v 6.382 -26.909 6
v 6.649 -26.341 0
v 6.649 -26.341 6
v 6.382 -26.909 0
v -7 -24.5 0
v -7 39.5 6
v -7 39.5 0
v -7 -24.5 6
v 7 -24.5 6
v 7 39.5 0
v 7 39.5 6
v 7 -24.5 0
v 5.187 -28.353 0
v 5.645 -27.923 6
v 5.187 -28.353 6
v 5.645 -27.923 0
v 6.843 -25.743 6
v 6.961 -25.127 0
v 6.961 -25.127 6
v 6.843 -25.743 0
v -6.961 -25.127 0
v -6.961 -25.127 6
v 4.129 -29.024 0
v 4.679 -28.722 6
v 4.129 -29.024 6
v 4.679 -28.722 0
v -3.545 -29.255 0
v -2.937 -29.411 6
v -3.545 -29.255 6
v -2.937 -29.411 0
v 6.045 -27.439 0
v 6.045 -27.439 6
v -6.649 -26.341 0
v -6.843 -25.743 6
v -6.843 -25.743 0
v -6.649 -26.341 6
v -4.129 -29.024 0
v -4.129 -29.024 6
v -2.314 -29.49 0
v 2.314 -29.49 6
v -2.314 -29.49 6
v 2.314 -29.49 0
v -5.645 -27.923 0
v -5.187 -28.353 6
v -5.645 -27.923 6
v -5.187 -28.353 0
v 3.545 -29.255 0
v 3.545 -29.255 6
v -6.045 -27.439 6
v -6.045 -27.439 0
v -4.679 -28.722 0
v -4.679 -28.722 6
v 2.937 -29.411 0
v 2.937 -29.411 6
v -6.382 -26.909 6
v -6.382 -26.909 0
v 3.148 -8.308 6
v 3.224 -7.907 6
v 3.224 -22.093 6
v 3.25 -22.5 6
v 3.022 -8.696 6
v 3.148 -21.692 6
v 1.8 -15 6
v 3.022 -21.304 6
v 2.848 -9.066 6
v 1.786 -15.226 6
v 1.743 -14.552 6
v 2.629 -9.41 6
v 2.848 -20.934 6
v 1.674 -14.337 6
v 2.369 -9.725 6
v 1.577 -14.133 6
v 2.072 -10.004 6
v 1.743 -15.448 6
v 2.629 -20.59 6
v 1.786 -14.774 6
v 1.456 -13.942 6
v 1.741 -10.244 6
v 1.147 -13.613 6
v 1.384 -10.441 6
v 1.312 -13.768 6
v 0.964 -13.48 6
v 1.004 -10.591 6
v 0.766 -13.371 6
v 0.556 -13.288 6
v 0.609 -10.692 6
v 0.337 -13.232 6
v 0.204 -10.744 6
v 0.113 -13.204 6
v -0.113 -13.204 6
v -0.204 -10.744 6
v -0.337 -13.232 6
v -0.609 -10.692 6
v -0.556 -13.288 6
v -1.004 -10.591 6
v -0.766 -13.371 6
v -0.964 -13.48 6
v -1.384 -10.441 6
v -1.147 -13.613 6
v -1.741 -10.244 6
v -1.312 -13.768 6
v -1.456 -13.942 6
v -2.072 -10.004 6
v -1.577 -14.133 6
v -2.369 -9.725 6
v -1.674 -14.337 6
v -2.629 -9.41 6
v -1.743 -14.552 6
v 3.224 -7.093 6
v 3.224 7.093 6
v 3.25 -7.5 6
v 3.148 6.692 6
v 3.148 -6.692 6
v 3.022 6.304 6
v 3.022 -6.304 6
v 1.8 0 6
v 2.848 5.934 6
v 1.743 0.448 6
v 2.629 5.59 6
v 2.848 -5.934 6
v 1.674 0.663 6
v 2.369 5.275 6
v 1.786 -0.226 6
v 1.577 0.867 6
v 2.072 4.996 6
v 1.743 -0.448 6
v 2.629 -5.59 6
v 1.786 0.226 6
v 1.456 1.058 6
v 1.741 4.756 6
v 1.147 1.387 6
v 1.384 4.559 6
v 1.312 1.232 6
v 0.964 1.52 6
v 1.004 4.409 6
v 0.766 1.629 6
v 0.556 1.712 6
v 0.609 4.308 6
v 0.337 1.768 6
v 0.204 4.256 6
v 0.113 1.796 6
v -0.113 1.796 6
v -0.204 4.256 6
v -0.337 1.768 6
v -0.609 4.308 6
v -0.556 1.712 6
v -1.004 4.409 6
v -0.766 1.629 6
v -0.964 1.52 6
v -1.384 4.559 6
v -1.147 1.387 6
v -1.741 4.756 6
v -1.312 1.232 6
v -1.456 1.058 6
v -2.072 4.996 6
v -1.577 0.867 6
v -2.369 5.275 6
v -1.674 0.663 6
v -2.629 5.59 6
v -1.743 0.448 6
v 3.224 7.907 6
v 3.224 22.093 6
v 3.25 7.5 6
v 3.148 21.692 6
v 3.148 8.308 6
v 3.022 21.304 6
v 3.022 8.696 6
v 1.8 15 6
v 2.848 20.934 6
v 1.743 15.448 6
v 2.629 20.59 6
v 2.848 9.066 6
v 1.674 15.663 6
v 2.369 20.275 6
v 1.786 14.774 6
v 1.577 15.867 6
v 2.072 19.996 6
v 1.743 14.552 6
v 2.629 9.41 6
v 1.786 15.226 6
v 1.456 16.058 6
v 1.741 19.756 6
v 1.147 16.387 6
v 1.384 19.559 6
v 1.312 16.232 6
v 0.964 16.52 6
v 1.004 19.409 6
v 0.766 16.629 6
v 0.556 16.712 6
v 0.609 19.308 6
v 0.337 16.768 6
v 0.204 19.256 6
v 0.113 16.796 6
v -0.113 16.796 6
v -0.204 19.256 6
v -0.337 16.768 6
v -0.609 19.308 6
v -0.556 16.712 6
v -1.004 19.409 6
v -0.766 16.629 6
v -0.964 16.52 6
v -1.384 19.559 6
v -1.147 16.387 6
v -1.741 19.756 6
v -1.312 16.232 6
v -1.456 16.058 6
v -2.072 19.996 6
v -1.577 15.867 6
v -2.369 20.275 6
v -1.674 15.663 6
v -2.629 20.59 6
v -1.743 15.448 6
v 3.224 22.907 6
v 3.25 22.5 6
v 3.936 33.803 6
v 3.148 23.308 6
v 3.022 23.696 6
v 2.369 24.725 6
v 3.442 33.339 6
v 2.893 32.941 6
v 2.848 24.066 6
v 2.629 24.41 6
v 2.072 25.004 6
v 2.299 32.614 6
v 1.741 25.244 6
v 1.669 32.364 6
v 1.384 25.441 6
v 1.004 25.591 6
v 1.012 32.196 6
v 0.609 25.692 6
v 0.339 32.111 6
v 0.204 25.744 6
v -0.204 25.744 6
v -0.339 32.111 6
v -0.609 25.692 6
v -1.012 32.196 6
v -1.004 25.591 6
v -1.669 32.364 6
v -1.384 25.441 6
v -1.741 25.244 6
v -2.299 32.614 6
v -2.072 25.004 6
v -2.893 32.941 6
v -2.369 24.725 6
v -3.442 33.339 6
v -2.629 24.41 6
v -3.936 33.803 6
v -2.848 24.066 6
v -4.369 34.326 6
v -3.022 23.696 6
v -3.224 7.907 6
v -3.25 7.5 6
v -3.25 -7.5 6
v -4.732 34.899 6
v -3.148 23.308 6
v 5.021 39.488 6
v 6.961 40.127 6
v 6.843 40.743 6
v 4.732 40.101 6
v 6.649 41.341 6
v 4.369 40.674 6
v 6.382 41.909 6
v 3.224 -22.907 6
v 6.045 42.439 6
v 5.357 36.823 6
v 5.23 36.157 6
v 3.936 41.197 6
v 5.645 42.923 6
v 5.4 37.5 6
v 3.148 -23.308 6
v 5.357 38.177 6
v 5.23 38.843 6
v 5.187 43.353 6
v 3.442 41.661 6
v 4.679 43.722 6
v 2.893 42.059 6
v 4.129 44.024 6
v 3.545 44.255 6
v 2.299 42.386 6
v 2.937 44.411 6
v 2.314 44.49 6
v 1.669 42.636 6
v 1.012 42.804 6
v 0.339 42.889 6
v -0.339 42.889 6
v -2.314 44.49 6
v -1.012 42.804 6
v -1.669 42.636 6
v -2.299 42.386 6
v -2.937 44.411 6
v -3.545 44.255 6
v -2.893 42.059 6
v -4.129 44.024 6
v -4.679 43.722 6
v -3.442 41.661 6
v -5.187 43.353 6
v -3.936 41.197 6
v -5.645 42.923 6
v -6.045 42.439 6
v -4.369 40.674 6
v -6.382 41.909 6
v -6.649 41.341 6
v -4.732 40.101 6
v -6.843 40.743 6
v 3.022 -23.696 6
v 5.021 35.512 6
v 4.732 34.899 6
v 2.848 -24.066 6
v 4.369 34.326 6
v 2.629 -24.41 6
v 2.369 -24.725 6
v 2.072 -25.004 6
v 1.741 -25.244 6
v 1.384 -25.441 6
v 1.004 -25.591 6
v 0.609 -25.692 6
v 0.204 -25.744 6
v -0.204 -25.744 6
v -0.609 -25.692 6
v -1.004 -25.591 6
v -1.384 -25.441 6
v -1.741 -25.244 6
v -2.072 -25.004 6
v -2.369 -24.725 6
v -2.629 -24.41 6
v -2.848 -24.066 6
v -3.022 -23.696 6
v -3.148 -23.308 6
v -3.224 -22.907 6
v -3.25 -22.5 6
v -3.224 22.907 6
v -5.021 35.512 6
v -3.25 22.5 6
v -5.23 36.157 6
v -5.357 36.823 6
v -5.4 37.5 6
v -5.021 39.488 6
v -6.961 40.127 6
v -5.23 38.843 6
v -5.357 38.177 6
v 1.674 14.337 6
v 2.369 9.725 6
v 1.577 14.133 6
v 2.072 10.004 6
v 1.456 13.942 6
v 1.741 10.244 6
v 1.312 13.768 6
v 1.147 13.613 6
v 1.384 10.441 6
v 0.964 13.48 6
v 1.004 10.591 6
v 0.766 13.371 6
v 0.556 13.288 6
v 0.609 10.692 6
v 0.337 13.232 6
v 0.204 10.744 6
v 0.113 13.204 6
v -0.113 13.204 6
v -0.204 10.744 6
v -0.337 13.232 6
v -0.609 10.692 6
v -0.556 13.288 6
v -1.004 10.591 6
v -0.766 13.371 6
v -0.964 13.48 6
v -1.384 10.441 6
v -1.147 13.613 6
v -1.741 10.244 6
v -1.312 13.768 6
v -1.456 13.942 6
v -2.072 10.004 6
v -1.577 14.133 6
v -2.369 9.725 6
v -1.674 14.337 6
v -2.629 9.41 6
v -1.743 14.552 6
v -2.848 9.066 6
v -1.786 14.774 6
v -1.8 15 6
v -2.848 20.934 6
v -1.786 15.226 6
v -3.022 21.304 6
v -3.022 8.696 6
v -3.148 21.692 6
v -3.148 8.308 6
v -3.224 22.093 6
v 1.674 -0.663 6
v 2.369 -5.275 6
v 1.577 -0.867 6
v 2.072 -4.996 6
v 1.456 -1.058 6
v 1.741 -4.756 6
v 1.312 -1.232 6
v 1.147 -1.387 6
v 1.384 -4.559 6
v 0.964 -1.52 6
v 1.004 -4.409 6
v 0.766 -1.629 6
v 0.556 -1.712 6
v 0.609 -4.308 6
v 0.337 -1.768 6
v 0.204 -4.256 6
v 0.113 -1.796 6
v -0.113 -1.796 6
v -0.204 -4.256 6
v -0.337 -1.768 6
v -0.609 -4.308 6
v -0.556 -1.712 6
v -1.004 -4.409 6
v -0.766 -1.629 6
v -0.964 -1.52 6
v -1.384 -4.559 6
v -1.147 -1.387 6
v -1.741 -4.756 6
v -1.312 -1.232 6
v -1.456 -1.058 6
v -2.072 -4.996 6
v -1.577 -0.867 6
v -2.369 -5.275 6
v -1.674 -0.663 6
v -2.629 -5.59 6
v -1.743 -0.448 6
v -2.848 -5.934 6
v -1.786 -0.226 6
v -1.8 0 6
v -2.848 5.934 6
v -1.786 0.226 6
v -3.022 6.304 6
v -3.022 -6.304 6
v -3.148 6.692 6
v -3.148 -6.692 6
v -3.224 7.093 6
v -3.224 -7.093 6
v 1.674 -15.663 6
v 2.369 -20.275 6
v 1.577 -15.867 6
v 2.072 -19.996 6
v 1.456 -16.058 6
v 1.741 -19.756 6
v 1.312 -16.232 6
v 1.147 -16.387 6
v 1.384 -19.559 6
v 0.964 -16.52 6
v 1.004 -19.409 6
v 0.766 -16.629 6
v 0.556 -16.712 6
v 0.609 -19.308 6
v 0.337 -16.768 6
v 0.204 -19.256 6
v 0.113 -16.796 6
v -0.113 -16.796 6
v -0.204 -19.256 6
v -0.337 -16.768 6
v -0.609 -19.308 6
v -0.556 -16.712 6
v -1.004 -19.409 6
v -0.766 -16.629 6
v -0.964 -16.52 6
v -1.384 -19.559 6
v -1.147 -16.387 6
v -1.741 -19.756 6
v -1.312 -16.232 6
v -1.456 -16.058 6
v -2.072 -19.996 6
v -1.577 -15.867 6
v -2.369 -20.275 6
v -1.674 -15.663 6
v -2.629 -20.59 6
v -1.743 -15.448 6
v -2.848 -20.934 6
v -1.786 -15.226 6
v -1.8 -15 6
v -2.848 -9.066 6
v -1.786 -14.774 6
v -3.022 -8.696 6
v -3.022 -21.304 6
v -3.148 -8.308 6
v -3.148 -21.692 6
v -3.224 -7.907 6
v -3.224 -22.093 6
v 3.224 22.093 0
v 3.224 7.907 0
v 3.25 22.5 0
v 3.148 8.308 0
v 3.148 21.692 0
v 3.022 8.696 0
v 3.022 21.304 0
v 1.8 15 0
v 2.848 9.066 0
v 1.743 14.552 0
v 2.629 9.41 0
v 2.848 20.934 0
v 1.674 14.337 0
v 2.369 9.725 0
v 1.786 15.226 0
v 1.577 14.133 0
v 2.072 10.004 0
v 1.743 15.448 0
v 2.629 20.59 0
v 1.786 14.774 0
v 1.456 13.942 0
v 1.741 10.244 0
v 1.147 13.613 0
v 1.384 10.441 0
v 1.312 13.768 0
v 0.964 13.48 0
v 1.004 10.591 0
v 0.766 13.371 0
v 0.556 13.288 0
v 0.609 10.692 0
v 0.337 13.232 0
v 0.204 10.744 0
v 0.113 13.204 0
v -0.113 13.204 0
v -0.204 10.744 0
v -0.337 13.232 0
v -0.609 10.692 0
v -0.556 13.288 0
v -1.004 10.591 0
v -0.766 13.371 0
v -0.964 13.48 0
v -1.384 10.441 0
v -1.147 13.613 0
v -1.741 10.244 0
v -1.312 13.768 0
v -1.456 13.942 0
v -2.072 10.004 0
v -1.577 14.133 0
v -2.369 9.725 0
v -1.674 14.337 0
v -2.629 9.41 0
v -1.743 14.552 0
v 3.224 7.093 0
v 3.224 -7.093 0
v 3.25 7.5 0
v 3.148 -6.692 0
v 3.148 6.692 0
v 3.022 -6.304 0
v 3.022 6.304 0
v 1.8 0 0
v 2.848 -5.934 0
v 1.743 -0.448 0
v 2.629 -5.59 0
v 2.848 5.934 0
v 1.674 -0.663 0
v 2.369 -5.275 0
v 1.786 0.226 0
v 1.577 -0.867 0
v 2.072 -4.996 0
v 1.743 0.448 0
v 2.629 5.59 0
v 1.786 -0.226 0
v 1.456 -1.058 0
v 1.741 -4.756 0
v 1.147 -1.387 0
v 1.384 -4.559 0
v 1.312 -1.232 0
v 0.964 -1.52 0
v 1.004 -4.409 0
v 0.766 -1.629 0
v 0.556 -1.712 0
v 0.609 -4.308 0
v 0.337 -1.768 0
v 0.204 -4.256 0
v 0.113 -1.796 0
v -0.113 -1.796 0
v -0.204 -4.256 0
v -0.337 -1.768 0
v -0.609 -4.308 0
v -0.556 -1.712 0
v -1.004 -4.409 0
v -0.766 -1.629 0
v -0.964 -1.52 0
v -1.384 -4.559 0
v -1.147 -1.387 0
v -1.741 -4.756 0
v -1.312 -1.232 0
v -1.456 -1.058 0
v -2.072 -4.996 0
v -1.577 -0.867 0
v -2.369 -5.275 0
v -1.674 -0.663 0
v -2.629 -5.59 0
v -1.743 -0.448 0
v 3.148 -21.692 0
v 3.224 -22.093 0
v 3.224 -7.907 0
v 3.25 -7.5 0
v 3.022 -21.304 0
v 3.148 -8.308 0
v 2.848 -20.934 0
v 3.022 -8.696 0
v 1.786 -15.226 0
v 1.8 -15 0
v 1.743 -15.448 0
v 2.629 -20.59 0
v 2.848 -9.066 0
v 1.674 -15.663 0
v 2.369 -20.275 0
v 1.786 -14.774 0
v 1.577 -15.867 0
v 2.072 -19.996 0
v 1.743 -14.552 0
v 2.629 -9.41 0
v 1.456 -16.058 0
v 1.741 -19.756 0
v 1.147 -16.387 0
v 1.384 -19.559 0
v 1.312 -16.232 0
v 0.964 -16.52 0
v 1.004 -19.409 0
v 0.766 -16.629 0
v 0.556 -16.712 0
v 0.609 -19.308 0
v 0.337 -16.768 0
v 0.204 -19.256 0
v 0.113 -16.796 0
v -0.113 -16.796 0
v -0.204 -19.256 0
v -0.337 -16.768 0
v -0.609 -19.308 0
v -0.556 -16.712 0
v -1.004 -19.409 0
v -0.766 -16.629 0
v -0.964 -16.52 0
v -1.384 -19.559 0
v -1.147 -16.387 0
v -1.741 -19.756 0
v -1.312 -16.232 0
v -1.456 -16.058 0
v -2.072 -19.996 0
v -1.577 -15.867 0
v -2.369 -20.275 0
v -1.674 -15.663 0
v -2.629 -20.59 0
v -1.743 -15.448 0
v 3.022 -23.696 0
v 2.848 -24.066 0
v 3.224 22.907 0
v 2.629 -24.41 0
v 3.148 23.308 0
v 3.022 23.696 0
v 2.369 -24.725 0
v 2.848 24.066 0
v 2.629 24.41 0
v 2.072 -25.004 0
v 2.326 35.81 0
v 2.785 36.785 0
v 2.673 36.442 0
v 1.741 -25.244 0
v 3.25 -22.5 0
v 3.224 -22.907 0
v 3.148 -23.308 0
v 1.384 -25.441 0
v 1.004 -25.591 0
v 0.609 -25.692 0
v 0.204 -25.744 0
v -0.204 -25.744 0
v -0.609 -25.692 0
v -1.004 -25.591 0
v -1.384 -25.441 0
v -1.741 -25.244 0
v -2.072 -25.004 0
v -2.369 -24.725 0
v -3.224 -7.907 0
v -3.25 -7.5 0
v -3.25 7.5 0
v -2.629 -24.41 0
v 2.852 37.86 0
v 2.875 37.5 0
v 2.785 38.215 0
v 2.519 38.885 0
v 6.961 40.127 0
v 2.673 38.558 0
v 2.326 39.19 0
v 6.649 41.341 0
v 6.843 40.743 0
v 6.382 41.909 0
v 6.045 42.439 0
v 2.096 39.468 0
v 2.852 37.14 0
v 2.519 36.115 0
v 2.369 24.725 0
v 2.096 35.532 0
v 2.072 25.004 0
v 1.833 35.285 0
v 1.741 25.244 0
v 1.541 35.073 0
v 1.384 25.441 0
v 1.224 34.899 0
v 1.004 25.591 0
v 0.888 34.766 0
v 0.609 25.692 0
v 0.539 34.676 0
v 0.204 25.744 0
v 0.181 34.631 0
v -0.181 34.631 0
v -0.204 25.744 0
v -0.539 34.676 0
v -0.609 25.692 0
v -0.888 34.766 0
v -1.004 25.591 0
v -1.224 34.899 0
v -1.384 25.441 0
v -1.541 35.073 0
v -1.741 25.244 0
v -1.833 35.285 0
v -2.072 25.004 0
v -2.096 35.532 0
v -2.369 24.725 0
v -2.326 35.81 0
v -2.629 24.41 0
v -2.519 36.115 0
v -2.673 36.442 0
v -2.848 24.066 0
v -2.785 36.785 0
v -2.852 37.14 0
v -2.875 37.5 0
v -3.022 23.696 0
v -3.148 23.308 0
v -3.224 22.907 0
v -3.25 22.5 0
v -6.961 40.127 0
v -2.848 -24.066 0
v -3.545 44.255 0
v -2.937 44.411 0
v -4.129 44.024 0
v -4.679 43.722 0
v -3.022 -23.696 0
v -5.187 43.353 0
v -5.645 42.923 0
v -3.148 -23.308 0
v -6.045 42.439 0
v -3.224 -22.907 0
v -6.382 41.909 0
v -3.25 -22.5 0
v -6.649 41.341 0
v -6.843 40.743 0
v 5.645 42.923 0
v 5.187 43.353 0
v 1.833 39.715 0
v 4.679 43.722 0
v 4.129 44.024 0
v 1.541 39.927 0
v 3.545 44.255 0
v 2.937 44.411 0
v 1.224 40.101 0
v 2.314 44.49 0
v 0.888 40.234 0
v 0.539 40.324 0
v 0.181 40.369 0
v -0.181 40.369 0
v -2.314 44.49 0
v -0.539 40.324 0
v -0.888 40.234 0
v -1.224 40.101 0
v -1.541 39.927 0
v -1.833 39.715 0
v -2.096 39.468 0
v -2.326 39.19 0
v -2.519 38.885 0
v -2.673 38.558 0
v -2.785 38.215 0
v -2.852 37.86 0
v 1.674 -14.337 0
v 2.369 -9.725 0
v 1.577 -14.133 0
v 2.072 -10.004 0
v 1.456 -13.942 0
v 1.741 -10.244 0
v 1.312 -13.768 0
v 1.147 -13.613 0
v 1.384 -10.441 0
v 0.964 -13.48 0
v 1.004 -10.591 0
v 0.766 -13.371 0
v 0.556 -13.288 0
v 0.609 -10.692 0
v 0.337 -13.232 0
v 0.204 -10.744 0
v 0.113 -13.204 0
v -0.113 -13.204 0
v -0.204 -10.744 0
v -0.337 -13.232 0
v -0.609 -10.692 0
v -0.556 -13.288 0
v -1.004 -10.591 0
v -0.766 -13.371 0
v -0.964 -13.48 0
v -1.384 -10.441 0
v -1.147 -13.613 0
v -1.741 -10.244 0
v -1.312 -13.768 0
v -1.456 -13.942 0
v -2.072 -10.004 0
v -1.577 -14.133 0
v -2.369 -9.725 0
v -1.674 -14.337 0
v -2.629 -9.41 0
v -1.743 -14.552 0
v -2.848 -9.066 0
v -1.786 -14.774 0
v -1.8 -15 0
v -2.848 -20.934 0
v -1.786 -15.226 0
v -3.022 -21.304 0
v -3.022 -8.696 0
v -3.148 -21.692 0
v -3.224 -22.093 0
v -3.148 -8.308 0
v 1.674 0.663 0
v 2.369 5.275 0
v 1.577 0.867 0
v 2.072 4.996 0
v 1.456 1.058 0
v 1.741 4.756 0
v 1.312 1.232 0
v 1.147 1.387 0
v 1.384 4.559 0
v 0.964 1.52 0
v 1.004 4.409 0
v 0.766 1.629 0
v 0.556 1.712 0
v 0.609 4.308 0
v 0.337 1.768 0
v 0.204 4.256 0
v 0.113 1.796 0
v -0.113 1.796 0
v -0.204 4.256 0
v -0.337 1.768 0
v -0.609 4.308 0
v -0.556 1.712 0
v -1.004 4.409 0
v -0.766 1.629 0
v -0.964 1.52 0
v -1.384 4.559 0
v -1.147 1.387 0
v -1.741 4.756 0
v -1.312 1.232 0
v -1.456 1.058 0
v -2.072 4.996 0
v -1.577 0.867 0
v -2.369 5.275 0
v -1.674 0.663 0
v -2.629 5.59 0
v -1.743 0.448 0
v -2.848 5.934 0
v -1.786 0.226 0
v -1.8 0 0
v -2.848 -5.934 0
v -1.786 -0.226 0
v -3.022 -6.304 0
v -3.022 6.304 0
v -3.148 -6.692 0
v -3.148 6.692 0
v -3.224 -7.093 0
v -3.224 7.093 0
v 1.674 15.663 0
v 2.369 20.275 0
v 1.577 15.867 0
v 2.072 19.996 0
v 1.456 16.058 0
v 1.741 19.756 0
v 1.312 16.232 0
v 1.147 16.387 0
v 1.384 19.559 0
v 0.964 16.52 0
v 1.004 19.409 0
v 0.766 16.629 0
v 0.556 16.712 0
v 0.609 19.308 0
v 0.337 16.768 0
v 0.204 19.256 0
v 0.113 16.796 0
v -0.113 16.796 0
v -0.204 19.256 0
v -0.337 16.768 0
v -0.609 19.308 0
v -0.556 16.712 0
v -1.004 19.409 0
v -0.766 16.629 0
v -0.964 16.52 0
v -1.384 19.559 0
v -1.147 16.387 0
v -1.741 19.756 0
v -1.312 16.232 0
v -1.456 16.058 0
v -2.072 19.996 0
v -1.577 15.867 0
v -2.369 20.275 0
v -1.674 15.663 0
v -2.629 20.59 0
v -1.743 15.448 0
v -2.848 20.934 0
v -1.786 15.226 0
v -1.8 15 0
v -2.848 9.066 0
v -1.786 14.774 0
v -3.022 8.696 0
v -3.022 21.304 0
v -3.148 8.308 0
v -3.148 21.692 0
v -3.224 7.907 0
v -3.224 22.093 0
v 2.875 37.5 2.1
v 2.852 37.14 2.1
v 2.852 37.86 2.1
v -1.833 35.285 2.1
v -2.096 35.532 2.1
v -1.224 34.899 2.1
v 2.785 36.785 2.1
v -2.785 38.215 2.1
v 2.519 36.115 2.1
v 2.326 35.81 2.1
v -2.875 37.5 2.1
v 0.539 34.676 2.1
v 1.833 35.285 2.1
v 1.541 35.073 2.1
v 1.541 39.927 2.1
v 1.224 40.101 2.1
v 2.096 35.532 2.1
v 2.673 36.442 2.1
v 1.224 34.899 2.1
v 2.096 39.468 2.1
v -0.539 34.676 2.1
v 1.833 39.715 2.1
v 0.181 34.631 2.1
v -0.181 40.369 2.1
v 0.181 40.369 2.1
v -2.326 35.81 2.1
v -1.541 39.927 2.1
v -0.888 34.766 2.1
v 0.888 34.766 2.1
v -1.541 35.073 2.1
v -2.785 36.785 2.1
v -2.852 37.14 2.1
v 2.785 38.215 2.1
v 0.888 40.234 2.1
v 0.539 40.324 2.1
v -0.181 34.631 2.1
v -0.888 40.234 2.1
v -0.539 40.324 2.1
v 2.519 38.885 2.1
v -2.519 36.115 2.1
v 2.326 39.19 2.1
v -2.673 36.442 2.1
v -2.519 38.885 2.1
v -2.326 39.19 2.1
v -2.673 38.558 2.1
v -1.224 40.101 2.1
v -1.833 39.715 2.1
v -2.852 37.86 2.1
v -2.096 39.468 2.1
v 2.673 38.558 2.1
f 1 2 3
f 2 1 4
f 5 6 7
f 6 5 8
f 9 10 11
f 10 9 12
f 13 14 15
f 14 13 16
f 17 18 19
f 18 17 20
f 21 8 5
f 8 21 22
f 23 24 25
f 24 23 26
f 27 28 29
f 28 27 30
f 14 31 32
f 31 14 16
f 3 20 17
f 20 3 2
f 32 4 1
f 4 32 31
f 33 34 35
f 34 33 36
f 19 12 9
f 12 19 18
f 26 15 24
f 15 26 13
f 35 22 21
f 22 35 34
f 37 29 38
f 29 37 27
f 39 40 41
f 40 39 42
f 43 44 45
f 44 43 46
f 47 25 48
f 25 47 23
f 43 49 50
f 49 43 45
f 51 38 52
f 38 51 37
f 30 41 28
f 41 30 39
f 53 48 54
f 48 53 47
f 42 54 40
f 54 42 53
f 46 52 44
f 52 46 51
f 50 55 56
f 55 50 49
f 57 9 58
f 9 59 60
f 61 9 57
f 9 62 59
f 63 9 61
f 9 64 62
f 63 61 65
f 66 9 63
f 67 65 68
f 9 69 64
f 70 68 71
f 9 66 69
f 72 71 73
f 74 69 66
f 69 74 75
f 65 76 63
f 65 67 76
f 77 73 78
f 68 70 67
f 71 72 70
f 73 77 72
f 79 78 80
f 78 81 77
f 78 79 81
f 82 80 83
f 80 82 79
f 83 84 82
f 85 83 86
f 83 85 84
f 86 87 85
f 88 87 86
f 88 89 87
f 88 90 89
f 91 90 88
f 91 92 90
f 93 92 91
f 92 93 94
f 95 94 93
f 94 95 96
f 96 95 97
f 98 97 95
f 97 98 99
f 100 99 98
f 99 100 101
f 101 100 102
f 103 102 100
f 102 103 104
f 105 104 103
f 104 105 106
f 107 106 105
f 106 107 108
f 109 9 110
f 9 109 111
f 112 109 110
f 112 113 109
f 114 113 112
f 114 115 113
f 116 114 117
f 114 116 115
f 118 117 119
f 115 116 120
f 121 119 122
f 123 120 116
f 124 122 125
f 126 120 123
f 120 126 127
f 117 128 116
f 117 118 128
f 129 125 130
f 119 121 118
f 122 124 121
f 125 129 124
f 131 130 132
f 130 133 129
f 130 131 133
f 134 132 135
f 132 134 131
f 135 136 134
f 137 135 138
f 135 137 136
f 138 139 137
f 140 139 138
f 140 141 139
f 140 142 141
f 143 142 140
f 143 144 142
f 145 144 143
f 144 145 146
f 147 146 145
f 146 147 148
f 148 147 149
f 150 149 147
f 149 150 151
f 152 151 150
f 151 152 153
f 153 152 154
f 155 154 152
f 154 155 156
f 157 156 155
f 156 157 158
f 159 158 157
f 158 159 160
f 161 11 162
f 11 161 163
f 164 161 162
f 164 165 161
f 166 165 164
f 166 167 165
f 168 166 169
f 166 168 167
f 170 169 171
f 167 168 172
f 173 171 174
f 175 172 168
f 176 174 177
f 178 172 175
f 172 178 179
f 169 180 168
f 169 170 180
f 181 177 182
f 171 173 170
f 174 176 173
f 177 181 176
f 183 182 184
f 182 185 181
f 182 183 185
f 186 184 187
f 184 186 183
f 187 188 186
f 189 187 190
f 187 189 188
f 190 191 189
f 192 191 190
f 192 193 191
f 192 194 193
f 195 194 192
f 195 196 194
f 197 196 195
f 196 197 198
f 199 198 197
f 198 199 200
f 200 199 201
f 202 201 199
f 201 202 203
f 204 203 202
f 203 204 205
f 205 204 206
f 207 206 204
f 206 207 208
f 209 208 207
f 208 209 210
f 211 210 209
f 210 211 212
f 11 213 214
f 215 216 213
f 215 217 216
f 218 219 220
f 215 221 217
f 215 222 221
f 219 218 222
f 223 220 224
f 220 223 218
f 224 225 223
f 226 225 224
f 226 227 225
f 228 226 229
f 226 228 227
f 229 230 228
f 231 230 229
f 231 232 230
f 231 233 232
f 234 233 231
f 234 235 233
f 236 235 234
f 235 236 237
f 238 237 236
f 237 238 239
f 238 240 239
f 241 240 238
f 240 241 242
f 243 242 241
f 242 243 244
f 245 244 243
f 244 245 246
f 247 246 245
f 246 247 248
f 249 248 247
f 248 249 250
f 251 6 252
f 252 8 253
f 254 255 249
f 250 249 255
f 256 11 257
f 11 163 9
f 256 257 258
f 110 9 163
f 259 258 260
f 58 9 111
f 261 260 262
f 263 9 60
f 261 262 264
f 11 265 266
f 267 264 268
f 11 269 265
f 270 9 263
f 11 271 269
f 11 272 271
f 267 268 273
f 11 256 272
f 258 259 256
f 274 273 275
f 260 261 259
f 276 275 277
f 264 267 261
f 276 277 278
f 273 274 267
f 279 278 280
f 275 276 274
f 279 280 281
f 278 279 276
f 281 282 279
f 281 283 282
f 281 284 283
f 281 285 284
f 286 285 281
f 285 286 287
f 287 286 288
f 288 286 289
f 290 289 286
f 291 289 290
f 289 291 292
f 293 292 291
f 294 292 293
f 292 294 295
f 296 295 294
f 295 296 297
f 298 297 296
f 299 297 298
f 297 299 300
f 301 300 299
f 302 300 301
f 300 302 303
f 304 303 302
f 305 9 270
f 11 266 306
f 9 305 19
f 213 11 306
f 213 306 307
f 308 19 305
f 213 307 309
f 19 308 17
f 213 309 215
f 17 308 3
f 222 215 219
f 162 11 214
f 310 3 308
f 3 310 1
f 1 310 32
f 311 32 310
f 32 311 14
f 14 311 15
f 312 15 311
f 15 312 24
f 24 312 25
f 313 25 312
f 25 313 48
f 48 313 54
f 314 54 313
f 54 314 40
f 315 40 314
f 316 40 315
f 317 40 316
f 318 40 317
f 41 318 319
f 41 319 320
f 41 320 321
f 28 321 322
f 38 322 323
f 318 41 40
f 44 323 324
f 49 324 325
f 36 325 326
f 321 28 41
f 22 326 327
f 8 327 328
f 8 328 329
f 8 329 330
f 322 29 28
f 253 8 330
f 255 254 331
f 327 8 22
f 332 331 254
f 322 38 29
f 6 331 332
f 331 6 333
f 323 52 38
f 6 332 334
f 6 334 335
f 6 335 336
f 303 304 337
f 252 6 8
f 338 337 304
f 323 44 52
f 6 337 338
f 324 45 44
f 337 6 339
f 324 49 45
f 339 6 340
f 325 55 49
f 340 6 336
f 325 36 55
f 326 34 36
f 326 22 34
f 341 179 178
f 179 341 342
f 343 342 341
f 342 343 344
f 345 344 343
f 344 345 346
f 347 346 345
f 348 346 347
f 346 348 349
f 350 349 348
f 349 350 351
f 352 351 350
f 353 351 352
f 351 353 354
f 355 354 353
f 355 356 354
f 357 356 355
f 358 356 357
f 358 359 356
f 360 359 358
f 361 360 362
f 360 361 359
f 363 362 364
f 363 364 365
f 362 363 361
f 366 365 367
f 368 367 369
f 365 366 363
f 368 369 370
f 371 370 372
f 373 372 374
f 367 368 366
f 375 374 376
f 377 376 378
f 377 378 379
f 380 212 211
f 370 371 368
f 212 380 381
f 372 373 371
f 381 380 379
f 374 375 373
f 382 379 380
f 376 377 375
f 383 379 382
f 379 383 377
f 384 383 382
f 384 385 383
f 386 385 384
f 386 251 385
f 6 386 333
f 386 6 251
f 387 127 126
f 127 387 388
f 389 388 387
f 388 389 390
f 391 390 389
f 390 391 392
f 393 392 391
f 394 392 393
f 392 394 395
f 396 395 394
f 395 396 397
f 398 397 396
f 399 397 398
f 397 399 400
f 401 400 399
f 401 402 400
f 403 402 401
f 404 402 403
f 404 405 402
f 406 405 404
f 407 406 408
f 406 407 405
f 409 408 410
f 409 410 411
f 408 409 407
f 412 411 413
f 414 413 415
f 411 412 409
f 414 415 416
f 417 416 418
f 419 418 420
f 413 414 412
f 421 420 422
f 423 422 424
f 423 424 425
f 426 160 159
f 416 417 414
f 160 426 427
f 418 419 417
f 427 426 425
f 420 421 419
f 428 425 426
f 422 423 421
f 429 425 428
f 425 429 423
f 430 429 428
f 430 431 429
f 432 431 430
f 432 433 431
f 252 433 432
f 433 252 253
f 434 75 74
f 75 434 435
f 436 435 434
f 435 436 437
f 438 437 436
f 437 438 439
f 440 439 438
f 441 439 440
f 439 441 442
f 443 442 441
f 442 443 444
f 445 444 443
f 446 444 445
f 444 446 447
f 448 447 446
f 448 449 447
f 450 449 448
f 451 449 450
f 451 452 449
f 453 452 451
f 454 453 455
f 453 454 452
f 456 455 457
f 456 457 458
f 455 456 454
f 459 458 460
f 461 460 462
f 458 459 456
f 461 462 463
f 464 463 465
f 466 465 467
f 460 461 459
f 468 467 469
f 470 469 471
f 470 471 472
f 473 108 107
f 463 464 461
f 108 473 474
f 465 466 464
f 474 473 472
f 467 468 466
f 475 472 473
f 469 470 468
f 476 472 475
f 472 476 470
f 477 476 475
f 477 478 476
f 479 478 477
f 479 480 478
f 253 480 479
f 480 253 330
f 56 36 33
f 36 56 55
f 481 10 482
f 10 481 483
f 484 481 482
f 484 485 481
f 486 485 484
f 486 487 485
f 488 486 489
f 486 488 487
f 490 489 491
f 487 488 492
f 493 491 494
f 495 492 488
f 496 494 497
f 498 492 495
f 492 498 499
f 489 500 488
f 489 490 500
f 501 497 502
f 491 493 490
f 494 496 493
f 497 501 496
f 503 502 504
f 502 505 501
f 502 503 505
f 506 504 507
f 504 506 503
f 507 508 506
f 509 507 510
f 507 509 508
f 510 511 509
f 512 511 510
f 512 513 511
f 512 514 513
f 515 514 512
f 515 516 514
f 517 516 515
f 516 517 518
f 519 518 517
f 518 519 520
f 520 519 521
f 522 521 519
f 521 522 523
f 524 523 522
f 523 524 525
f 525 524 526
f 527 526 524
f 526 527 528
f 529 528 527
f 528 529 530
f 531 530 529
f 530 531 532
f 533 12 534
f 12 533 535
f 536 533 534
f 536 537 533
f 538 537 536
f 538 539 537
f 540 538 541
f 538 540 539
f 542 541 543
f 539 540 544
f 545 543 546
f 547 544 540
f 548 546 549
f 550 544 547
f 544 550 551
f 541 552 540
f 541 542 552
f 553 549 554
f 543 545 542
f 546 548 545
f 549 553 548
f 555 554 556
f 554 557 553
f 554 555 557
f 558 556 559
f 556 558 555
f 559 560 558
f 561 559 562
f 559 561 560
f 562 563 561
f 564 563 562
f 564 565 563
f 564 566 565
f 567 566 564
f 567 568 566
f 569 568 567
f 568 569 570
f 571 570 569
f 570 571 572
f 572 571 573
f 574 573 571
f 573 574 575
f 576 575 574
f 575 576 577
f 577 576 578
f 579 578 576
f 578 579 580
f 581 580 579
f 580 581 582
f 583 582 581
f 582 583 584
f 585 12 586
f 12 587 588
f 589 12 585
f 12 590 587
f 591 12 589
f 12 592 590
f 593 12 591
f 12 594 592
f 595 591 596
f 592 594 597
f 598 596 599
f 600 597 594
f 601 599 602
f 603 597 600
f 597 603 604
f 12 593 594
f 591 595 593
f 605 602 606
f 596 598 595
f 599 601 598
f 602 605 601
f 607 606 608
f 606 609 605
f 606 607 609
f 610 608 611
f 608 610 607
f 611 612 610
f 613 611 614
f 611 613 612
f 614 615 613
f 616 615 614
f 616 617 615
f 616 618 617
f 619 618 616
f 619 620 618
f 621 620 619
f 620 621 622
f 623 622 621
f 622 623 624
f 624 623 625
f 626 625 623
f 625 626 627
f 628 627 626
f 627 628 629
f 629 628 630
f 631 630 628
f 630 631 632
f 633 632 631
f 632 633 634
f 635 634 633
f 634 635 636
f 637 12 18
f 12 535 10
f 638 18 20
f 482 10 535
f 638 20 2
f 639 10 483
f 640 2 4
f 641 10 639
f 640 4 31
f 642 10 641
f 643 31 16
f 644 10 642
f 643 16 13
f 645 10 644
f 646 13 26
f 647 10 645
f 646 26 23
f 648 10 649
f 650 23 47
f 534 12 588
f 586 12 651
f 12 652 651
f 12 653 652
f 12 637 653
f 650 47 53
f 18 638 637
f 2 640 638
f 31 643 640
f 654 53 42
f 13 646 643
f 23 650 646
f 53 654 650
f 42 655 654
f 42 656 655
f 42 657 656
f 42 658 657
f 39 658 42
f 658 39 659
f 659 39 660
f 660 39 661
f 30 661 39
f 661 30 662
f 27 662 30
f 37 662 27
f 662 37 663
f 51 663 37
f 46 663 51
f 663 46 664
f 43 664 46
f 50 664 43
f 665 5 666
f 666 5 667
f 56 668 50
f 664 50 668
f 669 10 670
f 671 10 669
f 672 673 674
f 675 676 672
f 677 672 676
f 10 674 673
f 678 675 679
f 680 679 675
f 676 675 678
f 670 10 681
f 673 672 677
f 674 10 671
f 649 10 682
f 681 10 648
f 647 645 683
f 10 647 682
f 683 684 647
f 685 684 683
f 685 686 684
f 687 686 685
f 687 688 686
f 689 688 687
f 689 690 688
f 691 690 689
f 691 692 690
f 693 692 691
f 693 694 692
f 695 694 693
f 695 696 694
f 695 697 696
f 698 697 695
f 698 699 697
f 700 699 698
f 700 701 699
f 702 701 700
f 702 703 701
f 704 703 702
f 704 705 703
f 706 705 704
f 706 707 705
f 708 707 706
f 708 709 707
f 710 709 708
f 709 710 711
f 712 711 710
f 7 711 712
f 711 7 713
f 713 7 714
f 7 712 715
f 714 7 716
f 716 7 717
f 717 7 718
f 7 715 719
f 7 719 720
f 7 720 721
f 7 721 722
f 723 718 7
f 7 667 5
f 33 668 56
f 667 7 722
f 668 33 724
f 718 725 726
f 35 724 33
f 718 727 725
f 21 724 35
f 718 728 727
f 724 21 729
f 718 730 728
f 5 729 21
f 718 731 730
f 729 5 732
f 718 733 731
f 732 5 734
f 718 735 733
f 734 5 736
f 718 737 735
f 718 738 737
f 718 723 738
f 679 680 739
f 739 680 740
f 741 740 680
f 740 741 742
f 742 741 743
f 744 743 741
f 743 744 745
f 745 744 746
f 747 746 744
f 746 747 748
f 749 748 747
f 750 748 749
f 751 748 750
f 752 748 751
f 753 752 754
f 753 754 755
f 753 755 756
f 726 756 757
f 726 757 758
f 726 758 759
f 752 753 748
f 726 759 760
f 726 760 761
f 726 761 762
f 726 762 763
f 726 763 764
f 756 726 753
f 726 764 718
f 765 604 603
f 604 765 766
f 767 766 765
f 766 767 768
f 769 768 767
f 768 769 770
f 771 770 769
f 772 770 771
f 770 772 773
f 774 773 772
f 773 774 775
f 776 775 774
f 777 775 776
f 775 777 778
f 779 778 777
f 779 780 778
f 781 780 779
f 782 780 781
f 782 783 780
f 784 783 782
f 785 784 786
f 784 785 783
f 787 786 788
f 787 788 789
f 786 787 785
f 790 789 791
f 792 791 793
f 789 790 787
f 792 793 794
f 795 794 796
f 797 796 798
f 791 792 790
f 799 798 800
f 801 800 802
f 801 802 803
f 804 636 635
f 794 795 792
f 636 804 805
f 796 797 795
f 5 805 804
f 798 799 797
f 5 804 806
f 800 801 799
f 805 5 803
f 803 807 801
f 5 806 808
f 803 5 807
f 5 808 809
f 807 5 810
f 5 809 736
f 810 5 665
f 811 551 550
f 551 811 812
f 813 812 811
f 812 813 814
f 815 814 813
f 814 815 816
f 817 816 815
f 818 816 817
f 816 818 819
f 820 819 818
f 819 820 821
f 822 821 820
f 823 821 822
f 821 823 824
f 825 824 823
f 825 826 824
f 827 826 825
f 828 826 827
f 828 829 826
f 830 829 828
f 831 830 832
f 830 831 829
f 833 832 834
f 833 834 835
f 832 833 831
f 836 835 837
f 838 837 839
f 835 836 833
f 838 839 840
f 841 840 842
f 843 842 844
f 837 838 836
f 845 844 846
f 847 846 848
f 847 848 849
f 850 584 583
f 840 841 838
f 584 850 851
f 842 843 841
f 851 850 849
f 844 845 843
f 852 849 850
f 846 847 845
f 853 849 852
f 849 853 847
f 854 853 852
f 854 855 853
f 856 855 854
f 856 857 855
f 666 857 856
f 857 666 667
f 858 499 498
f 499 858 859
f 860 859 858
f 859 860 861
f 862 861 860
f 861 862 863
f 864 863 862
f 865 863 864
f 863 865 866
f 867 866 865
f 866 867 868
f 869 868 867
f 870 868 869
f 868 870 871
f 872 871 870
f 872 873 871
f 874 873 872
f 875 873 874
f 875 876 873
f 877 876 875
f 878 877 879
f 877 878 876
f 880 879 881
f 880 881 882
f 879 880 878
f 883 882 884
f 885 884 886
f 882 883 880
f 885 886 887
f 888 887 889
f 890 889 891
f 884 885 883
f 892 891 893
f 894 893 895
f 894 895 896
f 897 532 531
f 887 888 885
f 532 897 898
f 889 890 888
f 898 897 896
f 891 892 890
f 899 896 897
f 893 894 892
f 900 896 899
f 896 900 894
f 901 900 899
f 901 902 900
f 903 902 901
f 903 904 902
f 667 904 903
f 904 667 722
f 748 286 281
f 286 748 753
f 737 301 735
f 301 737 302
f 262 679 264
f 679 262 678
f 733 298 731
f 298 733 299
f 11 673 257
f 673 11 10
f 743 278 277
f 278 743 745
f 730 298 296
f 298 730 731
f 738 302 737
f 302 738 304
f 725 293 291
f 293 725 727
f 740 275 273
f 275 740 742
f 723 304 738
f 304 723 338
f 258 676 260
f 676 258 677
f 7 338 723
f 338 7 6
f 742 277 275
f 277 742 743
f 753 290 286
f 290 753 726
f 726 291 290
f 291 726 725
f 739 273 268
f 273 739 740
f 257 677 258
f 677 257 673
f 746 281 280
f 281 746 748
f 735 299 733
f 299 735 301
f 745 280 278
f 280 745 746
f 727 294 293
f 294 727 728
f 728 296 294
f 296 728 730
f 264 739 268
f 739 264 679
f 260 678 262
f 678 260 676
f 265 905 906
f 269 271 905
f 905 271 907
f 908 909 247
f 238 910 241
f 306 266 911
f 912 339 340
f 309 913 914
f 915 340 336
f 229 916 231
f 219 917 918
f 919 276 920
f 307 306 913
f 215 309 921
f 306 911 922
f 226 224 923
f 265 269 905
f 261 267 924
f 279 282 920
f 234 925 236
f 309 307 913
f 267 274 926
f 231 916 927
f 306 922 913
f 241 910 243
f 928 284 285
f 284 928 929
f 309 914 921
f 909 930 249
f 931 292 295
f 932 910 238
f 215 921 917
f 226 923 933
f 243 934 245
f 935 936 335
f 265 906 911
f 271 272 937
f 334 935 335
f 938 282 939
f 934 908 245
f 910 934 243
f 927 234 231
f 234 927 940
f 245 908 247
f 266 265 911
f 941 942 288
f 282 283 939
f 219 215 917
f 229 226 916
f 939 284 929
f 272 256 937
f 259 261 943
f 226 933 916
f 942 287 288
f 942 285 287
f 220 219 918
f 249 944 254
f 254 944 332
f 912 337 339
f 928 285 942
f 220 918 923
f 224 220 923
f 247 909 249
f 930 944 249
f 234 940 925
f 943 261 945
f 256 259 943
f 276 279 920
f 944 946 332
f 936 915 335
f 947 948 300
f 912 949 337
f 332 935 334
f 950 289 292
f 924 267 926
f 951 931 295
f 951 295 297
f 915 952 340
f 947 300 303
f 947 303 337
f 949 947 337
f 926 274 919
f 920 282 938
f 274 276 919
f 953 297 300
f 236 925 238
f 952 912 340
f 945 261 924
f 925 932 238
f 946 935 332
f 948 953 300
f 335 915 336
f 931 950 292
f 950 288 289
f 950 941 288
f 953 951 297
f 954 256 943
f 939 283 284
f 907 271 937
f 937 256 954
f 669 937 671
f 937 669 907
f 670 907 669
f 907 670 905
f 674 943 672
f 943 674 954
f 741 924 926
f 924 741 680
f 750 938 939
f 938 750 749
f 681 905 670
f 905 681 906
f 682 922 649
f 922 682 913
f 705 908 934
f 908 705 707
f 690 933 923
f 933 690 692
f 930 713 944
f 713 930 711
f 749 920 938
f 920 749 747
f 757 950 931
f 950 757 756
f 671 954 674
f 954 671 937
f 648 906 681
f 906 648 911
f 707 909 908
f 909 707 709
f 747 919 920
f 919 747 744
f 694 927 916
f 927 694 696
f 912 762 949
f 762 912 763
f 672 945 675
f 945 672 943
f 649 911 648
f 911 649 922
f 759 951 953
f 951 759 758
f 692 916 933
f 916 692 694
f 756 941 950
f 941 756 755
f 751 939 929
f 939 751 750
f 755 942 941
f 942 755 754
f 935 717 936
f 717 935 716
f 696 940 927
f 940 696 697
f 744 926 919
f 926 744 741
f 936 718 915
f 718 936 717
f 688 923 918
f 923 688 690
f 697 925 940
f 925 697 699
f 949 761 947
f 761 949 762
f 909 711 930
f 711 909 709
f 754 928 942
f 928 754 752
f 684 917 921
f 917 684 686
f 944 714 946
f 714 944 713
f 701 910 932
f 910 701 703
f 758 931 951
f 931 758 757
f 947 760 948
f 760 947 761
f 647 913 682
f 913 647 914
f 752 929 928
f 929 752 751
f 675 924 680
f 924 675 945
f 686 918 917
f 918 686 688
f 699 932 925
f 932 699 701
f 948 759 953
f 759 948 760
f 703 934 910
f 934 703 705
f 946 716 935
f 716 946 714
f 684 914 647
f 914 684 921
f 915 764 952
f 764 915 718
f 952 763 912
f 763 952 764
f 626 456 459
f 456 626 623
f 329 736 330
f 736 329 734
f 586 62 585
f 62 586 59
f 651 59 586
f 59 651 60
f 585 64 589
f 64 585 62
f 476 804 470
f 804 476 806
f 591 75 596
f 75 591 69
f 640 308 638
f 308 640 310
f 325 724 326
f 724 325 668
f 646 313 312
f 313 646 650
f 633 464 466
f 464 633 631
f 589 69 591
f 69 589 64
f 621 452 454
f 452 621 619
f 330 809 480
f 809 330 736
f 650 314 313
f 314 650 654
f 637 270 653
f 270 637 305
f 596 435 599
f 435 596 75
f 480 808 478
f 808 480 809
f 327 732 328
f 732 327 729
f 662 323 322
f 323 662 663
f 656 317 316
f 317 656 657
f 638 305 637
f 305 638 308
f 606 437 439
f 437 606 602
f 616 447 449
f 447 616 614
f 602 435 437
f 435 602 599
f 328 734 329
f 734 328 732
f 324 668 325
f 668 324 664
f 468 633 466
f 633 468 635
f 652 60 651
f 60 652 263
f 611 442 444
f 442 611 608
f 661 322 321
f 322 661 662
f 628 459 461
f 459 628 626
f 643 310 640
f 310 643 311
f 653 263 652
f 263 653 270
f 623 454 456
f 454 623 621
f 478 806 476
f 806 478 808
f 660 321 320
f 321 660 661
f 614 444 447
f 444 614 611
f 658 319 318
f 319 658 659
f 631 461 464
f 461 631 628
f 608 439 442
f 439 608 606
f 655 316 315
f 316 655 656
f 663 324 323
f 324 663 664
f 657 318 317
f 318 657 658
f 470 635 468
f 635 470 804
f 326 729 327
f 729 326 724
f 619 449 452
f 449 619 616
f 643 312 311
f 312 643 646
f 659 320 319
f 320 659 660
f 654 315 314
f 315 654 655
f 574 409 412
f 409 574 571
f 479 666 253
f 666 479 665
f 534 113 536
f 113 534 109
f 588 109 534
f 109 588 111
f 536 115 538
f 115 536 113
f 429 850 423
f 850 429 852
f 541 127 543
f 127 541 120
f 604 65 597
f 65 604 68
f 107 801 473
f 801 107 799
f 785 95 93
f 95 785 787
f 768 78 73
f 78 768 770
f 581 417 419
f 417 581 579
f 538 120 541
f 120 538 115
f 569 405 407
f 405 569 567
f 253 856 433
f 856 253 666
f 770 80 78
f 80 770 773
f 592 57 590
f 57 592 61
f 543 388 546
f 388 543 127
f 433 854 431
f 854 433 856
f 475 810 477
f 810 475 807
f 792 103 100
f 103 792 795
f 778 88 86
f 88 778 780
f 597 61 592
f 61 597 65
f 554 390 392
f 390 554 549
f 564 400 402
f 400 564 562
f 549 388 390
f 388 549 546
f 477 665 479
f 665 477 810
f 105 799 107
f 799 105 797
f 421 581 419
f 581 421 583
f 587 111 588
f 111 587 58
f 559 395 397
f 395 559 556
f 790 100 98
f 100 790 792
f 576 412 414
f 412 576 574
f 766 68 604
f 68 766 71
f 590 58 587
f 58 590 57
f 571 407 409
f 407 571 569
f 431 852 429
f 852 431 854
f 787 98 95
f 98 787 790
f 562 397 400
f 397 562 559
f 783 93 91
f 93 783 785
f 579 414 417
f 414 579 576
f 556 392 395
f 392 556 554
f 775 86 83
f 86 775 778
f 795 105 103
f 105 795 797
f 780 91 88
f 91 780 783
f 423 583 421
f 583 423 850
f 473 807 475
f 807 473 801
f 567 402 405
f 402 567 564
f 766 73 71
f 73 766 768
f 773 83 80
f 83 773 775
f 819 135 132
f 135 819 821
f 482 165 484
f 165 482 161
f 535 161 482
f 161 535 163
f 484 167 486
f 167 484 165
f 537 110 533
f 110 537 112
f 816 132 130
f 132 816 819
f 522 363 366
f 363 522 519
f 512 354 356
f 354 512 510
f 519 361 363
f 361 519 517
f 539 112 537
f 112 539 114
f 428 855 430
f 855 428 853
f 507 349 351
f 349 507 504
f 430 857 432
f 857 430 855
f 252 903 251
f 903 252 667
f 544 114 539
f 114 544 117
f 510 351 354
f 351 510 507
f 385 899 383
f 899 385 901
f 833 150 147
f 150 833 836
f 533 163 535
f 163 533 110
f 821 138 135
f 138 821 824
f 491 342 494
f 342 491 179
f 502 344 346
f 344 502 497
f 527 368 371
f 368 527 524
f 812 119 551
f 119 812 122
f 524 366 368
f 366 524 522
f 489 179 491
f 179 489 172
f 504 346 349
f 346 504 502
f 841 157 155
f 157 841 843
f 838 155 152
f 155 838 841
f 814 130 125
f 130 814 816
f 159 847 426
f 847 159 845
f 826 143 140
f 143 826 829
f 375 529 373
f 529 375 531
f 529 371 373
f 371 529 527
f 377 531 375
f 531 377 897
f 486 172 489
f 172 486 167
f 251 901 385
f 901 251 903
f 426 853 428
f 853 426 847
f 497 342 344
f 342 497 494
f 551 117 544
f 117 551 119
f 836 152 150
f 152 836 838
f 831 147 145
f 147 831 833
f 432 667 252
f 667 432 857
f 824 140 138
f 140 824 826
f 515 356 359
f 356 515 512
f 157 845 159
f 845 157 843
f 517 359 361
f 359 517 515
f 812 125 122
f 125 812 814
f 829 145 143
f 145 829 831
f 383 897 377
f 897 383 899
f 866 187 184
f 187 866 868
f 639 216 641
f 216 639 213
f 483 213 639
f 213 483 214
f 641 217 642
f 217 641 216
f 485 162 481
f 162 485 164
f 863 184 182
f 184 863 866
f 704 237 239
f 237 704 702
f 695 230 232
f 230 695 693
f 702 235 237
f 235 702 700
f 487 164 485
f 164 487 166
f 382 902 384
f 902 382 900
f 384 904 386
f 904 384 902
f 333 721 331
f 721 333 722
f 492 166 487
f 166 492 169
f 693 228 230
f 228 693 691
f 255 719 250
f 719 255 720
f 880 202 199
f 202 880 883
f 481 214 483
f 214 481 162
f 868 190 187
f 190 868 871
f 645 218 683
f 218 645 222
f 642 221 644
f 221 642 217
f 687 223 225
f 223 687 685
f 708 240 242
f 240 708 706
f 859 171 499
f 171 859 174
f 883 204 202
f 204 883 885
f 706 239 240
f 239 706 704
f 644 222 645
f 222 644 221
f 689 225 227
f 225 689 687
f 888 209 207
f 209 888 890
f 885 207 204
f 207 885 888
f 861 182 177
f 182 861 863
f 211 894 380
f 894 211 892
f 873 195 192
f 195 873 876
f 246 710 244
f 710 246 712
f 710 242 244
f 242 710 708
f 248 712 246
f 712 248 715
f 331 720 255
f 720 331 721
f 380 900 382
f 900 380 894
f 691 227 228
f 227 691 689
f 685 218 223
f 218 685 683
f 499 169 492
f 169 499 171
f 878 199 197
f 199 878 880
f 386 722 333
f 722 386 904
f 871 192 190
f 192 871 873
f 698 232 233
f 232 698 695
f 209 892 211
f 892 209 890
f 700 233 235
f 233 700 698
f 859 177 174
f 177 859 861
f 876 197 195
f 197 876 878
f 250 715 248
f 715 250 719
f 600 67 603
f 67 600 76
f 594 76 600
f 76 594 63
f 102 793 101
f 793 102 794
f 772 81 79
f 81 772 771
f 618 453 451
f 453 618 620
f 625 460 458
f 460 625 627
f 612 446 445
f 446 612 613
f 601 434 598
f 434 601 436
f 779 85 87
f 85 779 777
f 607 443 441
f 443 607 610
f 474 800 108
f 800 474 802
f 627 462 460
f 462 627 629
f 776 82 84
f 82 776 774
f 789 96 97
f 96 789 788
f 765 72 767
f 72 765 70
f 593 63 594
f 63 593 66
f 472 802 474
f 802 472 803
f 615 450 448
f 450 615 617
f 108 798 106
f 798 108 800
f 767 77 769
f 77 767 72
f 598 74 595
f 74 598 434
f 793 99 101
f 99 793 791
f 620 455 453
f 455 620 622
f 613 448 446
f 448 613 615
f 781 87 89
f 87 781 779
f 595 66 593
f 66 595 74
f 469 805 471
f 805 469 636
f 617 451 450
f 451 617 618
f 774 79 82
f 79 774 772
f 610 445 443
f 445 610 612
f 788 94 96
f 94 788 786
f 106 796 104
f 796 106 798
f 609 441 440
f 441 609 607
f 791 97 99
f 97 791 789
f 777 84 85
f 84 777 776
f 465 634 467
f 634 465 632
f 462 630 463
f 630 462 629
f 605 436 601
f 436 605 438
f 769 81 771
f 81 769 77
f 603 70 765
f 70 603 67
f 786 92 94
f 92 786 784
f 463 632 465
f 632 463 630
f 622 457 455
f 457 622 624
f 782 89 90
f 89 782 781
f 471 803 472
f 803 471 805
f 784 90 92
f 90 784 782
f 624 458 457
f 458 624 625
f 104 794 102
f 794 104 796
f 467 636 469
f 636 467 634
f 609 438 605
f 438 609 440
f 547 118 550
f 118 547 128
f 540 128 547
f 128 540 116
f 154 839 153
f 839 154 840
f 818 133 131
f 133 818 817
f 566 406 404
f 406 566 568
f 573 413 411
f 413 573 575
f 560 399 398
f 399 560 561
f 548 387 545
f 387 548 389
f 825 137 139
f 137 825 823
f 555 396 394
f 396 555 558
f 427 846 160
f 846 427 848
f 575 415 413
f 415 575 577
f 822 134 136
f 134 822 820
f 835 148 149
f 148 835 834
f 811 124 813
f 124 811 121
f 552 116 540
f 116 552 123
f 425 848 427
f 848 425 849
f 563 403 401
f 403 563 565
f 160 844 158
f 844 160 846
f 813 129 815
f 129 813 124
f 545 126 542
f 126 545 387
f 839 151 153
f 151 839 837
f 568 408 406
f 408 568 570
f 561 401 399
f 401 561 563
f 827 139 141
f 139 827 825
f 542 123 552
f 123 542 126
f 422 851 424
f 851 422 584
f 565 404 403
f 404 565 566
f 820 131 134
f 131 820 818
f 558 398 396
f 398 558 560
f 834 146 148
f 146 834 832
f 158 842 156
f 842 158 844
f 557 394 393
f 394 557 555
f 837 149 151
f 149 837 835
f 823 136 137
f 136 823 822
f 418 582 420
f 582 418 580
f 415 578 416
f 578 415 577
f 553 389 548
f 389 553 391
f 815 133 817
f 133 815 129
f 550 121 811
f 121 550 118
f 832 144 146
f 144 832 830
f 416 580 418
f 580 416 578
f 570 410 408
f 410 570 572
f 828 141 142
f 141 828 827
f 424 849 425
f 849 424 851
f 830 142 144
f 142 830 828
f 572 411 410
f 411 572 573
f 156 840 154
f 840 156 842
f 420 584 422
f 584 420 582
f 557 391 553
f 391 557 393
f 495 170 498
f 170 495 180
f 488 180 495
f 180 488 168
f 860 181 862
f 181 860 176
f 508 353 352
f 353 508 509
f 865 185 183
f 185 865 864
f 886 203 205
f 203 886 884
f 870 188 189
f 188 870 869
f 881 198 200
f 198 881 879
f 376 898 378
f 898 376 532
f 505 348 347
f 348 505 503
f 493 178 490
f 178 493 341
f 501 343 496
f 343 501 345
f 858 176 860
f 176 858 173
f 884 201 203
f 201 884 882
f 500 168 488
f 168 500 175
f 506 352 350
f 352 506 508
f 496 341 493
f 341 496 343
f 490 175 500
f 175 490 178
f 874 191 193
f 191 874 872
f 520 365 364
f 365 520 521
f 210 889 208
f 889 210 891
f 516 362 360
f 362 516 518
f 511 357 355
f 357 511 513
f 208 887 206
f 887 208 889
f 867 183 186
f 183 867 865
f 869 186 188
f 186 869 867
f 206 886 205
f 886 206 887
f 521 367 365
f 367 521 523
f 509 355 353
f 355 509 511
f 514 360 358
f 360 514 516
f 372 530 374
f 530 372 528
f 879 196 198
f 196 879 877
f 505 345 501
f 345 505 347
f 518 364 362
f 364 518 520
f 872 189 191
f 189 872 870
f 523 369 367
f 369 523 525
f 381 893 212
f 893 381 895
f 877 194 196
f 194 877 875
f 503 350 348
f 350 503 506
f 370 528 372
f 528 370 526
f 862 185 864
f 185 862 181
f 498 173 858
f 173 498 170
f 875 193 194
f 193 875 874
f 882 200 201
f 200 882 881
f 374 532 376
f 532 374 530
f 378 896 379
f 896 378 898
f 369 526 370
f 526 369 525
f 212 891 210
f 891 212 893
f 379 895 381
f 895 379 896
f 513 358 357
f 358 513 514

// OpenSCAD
$fn = 50;


difference() {
	union() {
		hull() {
			translate(v = [-2.0000000000, 24.5000000000, 0]) {
				cylinder(h = 6, r = 5);
			}
			translate(v = [2.0000000000, 24.5000000000, 0]) {
				cylinder(h = 6, r = 5);
			}
			translate(v = [-2.0000000000, -24.5000000000, 0]) {
				cylinder(h = 6, r = 5);
			}
			translate(v = [2.0000000000, -24.5000000000, 0]) {
				cylinder(h = 6, r = 5);
			}
		}
		translate(v = [0.0000000000, 30.0000000000, 0]) {
			hull() {
				translate(v = [-2.0000000000, 9.5000000000, 0]) {
					cylinder(h = 6, r = 5);
				}
				translate(v = [2.0000000000, 9.5000000000, 0]) {
					cylinder(h = 6, r = 5);
				}
				translate(v = [-2.0000000000, -9.5000000000, 0]) {
					cylinder(h = 6, r = 5);
				}
				translate(v = [2.0000000000, -9.5000000000, 0]) {
					cylinder(h = 6, r = 5);
				}
			}
		}
		translate(v = [0.0000000000, 30.0000000000, 0]) {
			hull() {
				translate(v = [-2.0000000000, 9.5000000000, 0]) {
					cylinder(h = 6, r = 5);
				}
				translate(v = [2.0000000000, 9.5000000000, 0]) {
					cylinder(h = 6, r = 5);
				}
				translate(v = [-2.0000000000, -9.5000000000, 0]) {
					cylinder(h = 6, r = 5);
				}
				translate(v = [2.0000000000, -9.5000000000, 0]) {
					cylinder(h = 6, r = 5);
				}
			}
		}
	}
	union() {
		translate(v = [0.0000000000, 37.5000000000, 6]) {
			rotate(a = [0, 0, 0]) {
				difference() {
					union() {
						#translate(v = [0, 0, -6.0000000000]) {
							cylinder(h = 6, r = 2.6000000000);
						}
						#translate(v = [0, 0, -3.9000000000]) {
							cylinder(h = 3.9000000000, r1 = 2.8750000000, r2 = 5.4000000000);
						}
						#translate(v = [0, 0, -6.0000000000]) {
							cylinder(h = 6, r = 2.8750000000);
						}
						#translate(v = [0, 0, -6.0000000000]) {
							cylinder(h = 6, r = 2.6000000000);
						}
					}
					union();
				}
			}
		}
		translate(v = [0.0000000000, 37.5000000000, 6]) {
			rotate(a = [0, 0, 0]) {
				difference() {
					union() {
						#translate(v = [0, 0, -6.0000000000]) {
							cylinder(h = 6, r = 2.6000000000);
						}
						#translate(v = [0, 0, -3.9000000000]) {
							cylinder(h = 3.9000000000, r1 = 2.8750000000, r2 = 5.4000000000);
						}
						#translate(v = [0, 0, -6.0000000000]) {
							cylinder(h = 6, r = 2.8750000000);
						}
						#translate(v = [0, 0, -6.0000000000]) {
							cylinder(h = 6, r = 2.6000000000);
						}
					}
					union();
				}
			}
		}
		translate(v = [0.0000000000, -22.5000000000, 0]) {
			translate(v = [0, 0, -100]) {
				cylinder(h = 200, r = 3.2500000000);
			}
		}
		translate(v = [0.0000000000, -7.5000000000, 0]) {
			translate(v = [0, 0, -100]) {
				cylinder(h = 200, r = 3.2500000000);
			}
		}
		translate(v = [0.0000000000, 7.5000000000, 0]) {
			translate(v = [0, 0, -100]) {
				cylinder(h = 200, r = 3.2500000000);
			}
		}
		translate(v = [0.0000000000, 22.5000000000, 0]) {
			translate(v = [0, 0, -100]) {
				cylinder(h = 200, r = 3.2500000000);
			}
		}
		translate(v = [0.0000000000, -22.5000000000, 0]) {
			translate(v = [0, 0, -100]) {
				cylinder(h = 200, r = 1.8000000000);
			}
		}
		translate(v = [0.0000000000, -15.0000000000, 0]) {
			translate(v = [0, 0, -100]) {
				cylinder(h = 200, r = 1.8000000000);
			}
		}
		translate(v = [0.0000000000, -7.5000000000, 0]) {
			translate(v = [0, 0, -100]) {
				cylinder(h = 200, r = 1.8000000000);
			}
		}
		translate(v = [0, 0, -100]) {
			cylinder(h = 200, r = 1.8000000000);
		}
		translate(v = [0.0000000000, 7.5000000000, 0]) {
			translate(v = [0, 0, -100]) {
				cylinder(h = 200, r = 1.8000000000);
			}
		}
		translate(v = [0.0000000000, 15.0000000000, 0]) {
			translate(v = [0, 0, -100]) {
				cylinder(h = 200, r = 1.8000000000);
			}
		}
		translate(v = [0.0000000000, 22.5000000000, 0]) {
			translate(v = [0, 0, -100]) {
				cylinder(h = 200, r = 1.8000000000);
			}
		}
	}
}
